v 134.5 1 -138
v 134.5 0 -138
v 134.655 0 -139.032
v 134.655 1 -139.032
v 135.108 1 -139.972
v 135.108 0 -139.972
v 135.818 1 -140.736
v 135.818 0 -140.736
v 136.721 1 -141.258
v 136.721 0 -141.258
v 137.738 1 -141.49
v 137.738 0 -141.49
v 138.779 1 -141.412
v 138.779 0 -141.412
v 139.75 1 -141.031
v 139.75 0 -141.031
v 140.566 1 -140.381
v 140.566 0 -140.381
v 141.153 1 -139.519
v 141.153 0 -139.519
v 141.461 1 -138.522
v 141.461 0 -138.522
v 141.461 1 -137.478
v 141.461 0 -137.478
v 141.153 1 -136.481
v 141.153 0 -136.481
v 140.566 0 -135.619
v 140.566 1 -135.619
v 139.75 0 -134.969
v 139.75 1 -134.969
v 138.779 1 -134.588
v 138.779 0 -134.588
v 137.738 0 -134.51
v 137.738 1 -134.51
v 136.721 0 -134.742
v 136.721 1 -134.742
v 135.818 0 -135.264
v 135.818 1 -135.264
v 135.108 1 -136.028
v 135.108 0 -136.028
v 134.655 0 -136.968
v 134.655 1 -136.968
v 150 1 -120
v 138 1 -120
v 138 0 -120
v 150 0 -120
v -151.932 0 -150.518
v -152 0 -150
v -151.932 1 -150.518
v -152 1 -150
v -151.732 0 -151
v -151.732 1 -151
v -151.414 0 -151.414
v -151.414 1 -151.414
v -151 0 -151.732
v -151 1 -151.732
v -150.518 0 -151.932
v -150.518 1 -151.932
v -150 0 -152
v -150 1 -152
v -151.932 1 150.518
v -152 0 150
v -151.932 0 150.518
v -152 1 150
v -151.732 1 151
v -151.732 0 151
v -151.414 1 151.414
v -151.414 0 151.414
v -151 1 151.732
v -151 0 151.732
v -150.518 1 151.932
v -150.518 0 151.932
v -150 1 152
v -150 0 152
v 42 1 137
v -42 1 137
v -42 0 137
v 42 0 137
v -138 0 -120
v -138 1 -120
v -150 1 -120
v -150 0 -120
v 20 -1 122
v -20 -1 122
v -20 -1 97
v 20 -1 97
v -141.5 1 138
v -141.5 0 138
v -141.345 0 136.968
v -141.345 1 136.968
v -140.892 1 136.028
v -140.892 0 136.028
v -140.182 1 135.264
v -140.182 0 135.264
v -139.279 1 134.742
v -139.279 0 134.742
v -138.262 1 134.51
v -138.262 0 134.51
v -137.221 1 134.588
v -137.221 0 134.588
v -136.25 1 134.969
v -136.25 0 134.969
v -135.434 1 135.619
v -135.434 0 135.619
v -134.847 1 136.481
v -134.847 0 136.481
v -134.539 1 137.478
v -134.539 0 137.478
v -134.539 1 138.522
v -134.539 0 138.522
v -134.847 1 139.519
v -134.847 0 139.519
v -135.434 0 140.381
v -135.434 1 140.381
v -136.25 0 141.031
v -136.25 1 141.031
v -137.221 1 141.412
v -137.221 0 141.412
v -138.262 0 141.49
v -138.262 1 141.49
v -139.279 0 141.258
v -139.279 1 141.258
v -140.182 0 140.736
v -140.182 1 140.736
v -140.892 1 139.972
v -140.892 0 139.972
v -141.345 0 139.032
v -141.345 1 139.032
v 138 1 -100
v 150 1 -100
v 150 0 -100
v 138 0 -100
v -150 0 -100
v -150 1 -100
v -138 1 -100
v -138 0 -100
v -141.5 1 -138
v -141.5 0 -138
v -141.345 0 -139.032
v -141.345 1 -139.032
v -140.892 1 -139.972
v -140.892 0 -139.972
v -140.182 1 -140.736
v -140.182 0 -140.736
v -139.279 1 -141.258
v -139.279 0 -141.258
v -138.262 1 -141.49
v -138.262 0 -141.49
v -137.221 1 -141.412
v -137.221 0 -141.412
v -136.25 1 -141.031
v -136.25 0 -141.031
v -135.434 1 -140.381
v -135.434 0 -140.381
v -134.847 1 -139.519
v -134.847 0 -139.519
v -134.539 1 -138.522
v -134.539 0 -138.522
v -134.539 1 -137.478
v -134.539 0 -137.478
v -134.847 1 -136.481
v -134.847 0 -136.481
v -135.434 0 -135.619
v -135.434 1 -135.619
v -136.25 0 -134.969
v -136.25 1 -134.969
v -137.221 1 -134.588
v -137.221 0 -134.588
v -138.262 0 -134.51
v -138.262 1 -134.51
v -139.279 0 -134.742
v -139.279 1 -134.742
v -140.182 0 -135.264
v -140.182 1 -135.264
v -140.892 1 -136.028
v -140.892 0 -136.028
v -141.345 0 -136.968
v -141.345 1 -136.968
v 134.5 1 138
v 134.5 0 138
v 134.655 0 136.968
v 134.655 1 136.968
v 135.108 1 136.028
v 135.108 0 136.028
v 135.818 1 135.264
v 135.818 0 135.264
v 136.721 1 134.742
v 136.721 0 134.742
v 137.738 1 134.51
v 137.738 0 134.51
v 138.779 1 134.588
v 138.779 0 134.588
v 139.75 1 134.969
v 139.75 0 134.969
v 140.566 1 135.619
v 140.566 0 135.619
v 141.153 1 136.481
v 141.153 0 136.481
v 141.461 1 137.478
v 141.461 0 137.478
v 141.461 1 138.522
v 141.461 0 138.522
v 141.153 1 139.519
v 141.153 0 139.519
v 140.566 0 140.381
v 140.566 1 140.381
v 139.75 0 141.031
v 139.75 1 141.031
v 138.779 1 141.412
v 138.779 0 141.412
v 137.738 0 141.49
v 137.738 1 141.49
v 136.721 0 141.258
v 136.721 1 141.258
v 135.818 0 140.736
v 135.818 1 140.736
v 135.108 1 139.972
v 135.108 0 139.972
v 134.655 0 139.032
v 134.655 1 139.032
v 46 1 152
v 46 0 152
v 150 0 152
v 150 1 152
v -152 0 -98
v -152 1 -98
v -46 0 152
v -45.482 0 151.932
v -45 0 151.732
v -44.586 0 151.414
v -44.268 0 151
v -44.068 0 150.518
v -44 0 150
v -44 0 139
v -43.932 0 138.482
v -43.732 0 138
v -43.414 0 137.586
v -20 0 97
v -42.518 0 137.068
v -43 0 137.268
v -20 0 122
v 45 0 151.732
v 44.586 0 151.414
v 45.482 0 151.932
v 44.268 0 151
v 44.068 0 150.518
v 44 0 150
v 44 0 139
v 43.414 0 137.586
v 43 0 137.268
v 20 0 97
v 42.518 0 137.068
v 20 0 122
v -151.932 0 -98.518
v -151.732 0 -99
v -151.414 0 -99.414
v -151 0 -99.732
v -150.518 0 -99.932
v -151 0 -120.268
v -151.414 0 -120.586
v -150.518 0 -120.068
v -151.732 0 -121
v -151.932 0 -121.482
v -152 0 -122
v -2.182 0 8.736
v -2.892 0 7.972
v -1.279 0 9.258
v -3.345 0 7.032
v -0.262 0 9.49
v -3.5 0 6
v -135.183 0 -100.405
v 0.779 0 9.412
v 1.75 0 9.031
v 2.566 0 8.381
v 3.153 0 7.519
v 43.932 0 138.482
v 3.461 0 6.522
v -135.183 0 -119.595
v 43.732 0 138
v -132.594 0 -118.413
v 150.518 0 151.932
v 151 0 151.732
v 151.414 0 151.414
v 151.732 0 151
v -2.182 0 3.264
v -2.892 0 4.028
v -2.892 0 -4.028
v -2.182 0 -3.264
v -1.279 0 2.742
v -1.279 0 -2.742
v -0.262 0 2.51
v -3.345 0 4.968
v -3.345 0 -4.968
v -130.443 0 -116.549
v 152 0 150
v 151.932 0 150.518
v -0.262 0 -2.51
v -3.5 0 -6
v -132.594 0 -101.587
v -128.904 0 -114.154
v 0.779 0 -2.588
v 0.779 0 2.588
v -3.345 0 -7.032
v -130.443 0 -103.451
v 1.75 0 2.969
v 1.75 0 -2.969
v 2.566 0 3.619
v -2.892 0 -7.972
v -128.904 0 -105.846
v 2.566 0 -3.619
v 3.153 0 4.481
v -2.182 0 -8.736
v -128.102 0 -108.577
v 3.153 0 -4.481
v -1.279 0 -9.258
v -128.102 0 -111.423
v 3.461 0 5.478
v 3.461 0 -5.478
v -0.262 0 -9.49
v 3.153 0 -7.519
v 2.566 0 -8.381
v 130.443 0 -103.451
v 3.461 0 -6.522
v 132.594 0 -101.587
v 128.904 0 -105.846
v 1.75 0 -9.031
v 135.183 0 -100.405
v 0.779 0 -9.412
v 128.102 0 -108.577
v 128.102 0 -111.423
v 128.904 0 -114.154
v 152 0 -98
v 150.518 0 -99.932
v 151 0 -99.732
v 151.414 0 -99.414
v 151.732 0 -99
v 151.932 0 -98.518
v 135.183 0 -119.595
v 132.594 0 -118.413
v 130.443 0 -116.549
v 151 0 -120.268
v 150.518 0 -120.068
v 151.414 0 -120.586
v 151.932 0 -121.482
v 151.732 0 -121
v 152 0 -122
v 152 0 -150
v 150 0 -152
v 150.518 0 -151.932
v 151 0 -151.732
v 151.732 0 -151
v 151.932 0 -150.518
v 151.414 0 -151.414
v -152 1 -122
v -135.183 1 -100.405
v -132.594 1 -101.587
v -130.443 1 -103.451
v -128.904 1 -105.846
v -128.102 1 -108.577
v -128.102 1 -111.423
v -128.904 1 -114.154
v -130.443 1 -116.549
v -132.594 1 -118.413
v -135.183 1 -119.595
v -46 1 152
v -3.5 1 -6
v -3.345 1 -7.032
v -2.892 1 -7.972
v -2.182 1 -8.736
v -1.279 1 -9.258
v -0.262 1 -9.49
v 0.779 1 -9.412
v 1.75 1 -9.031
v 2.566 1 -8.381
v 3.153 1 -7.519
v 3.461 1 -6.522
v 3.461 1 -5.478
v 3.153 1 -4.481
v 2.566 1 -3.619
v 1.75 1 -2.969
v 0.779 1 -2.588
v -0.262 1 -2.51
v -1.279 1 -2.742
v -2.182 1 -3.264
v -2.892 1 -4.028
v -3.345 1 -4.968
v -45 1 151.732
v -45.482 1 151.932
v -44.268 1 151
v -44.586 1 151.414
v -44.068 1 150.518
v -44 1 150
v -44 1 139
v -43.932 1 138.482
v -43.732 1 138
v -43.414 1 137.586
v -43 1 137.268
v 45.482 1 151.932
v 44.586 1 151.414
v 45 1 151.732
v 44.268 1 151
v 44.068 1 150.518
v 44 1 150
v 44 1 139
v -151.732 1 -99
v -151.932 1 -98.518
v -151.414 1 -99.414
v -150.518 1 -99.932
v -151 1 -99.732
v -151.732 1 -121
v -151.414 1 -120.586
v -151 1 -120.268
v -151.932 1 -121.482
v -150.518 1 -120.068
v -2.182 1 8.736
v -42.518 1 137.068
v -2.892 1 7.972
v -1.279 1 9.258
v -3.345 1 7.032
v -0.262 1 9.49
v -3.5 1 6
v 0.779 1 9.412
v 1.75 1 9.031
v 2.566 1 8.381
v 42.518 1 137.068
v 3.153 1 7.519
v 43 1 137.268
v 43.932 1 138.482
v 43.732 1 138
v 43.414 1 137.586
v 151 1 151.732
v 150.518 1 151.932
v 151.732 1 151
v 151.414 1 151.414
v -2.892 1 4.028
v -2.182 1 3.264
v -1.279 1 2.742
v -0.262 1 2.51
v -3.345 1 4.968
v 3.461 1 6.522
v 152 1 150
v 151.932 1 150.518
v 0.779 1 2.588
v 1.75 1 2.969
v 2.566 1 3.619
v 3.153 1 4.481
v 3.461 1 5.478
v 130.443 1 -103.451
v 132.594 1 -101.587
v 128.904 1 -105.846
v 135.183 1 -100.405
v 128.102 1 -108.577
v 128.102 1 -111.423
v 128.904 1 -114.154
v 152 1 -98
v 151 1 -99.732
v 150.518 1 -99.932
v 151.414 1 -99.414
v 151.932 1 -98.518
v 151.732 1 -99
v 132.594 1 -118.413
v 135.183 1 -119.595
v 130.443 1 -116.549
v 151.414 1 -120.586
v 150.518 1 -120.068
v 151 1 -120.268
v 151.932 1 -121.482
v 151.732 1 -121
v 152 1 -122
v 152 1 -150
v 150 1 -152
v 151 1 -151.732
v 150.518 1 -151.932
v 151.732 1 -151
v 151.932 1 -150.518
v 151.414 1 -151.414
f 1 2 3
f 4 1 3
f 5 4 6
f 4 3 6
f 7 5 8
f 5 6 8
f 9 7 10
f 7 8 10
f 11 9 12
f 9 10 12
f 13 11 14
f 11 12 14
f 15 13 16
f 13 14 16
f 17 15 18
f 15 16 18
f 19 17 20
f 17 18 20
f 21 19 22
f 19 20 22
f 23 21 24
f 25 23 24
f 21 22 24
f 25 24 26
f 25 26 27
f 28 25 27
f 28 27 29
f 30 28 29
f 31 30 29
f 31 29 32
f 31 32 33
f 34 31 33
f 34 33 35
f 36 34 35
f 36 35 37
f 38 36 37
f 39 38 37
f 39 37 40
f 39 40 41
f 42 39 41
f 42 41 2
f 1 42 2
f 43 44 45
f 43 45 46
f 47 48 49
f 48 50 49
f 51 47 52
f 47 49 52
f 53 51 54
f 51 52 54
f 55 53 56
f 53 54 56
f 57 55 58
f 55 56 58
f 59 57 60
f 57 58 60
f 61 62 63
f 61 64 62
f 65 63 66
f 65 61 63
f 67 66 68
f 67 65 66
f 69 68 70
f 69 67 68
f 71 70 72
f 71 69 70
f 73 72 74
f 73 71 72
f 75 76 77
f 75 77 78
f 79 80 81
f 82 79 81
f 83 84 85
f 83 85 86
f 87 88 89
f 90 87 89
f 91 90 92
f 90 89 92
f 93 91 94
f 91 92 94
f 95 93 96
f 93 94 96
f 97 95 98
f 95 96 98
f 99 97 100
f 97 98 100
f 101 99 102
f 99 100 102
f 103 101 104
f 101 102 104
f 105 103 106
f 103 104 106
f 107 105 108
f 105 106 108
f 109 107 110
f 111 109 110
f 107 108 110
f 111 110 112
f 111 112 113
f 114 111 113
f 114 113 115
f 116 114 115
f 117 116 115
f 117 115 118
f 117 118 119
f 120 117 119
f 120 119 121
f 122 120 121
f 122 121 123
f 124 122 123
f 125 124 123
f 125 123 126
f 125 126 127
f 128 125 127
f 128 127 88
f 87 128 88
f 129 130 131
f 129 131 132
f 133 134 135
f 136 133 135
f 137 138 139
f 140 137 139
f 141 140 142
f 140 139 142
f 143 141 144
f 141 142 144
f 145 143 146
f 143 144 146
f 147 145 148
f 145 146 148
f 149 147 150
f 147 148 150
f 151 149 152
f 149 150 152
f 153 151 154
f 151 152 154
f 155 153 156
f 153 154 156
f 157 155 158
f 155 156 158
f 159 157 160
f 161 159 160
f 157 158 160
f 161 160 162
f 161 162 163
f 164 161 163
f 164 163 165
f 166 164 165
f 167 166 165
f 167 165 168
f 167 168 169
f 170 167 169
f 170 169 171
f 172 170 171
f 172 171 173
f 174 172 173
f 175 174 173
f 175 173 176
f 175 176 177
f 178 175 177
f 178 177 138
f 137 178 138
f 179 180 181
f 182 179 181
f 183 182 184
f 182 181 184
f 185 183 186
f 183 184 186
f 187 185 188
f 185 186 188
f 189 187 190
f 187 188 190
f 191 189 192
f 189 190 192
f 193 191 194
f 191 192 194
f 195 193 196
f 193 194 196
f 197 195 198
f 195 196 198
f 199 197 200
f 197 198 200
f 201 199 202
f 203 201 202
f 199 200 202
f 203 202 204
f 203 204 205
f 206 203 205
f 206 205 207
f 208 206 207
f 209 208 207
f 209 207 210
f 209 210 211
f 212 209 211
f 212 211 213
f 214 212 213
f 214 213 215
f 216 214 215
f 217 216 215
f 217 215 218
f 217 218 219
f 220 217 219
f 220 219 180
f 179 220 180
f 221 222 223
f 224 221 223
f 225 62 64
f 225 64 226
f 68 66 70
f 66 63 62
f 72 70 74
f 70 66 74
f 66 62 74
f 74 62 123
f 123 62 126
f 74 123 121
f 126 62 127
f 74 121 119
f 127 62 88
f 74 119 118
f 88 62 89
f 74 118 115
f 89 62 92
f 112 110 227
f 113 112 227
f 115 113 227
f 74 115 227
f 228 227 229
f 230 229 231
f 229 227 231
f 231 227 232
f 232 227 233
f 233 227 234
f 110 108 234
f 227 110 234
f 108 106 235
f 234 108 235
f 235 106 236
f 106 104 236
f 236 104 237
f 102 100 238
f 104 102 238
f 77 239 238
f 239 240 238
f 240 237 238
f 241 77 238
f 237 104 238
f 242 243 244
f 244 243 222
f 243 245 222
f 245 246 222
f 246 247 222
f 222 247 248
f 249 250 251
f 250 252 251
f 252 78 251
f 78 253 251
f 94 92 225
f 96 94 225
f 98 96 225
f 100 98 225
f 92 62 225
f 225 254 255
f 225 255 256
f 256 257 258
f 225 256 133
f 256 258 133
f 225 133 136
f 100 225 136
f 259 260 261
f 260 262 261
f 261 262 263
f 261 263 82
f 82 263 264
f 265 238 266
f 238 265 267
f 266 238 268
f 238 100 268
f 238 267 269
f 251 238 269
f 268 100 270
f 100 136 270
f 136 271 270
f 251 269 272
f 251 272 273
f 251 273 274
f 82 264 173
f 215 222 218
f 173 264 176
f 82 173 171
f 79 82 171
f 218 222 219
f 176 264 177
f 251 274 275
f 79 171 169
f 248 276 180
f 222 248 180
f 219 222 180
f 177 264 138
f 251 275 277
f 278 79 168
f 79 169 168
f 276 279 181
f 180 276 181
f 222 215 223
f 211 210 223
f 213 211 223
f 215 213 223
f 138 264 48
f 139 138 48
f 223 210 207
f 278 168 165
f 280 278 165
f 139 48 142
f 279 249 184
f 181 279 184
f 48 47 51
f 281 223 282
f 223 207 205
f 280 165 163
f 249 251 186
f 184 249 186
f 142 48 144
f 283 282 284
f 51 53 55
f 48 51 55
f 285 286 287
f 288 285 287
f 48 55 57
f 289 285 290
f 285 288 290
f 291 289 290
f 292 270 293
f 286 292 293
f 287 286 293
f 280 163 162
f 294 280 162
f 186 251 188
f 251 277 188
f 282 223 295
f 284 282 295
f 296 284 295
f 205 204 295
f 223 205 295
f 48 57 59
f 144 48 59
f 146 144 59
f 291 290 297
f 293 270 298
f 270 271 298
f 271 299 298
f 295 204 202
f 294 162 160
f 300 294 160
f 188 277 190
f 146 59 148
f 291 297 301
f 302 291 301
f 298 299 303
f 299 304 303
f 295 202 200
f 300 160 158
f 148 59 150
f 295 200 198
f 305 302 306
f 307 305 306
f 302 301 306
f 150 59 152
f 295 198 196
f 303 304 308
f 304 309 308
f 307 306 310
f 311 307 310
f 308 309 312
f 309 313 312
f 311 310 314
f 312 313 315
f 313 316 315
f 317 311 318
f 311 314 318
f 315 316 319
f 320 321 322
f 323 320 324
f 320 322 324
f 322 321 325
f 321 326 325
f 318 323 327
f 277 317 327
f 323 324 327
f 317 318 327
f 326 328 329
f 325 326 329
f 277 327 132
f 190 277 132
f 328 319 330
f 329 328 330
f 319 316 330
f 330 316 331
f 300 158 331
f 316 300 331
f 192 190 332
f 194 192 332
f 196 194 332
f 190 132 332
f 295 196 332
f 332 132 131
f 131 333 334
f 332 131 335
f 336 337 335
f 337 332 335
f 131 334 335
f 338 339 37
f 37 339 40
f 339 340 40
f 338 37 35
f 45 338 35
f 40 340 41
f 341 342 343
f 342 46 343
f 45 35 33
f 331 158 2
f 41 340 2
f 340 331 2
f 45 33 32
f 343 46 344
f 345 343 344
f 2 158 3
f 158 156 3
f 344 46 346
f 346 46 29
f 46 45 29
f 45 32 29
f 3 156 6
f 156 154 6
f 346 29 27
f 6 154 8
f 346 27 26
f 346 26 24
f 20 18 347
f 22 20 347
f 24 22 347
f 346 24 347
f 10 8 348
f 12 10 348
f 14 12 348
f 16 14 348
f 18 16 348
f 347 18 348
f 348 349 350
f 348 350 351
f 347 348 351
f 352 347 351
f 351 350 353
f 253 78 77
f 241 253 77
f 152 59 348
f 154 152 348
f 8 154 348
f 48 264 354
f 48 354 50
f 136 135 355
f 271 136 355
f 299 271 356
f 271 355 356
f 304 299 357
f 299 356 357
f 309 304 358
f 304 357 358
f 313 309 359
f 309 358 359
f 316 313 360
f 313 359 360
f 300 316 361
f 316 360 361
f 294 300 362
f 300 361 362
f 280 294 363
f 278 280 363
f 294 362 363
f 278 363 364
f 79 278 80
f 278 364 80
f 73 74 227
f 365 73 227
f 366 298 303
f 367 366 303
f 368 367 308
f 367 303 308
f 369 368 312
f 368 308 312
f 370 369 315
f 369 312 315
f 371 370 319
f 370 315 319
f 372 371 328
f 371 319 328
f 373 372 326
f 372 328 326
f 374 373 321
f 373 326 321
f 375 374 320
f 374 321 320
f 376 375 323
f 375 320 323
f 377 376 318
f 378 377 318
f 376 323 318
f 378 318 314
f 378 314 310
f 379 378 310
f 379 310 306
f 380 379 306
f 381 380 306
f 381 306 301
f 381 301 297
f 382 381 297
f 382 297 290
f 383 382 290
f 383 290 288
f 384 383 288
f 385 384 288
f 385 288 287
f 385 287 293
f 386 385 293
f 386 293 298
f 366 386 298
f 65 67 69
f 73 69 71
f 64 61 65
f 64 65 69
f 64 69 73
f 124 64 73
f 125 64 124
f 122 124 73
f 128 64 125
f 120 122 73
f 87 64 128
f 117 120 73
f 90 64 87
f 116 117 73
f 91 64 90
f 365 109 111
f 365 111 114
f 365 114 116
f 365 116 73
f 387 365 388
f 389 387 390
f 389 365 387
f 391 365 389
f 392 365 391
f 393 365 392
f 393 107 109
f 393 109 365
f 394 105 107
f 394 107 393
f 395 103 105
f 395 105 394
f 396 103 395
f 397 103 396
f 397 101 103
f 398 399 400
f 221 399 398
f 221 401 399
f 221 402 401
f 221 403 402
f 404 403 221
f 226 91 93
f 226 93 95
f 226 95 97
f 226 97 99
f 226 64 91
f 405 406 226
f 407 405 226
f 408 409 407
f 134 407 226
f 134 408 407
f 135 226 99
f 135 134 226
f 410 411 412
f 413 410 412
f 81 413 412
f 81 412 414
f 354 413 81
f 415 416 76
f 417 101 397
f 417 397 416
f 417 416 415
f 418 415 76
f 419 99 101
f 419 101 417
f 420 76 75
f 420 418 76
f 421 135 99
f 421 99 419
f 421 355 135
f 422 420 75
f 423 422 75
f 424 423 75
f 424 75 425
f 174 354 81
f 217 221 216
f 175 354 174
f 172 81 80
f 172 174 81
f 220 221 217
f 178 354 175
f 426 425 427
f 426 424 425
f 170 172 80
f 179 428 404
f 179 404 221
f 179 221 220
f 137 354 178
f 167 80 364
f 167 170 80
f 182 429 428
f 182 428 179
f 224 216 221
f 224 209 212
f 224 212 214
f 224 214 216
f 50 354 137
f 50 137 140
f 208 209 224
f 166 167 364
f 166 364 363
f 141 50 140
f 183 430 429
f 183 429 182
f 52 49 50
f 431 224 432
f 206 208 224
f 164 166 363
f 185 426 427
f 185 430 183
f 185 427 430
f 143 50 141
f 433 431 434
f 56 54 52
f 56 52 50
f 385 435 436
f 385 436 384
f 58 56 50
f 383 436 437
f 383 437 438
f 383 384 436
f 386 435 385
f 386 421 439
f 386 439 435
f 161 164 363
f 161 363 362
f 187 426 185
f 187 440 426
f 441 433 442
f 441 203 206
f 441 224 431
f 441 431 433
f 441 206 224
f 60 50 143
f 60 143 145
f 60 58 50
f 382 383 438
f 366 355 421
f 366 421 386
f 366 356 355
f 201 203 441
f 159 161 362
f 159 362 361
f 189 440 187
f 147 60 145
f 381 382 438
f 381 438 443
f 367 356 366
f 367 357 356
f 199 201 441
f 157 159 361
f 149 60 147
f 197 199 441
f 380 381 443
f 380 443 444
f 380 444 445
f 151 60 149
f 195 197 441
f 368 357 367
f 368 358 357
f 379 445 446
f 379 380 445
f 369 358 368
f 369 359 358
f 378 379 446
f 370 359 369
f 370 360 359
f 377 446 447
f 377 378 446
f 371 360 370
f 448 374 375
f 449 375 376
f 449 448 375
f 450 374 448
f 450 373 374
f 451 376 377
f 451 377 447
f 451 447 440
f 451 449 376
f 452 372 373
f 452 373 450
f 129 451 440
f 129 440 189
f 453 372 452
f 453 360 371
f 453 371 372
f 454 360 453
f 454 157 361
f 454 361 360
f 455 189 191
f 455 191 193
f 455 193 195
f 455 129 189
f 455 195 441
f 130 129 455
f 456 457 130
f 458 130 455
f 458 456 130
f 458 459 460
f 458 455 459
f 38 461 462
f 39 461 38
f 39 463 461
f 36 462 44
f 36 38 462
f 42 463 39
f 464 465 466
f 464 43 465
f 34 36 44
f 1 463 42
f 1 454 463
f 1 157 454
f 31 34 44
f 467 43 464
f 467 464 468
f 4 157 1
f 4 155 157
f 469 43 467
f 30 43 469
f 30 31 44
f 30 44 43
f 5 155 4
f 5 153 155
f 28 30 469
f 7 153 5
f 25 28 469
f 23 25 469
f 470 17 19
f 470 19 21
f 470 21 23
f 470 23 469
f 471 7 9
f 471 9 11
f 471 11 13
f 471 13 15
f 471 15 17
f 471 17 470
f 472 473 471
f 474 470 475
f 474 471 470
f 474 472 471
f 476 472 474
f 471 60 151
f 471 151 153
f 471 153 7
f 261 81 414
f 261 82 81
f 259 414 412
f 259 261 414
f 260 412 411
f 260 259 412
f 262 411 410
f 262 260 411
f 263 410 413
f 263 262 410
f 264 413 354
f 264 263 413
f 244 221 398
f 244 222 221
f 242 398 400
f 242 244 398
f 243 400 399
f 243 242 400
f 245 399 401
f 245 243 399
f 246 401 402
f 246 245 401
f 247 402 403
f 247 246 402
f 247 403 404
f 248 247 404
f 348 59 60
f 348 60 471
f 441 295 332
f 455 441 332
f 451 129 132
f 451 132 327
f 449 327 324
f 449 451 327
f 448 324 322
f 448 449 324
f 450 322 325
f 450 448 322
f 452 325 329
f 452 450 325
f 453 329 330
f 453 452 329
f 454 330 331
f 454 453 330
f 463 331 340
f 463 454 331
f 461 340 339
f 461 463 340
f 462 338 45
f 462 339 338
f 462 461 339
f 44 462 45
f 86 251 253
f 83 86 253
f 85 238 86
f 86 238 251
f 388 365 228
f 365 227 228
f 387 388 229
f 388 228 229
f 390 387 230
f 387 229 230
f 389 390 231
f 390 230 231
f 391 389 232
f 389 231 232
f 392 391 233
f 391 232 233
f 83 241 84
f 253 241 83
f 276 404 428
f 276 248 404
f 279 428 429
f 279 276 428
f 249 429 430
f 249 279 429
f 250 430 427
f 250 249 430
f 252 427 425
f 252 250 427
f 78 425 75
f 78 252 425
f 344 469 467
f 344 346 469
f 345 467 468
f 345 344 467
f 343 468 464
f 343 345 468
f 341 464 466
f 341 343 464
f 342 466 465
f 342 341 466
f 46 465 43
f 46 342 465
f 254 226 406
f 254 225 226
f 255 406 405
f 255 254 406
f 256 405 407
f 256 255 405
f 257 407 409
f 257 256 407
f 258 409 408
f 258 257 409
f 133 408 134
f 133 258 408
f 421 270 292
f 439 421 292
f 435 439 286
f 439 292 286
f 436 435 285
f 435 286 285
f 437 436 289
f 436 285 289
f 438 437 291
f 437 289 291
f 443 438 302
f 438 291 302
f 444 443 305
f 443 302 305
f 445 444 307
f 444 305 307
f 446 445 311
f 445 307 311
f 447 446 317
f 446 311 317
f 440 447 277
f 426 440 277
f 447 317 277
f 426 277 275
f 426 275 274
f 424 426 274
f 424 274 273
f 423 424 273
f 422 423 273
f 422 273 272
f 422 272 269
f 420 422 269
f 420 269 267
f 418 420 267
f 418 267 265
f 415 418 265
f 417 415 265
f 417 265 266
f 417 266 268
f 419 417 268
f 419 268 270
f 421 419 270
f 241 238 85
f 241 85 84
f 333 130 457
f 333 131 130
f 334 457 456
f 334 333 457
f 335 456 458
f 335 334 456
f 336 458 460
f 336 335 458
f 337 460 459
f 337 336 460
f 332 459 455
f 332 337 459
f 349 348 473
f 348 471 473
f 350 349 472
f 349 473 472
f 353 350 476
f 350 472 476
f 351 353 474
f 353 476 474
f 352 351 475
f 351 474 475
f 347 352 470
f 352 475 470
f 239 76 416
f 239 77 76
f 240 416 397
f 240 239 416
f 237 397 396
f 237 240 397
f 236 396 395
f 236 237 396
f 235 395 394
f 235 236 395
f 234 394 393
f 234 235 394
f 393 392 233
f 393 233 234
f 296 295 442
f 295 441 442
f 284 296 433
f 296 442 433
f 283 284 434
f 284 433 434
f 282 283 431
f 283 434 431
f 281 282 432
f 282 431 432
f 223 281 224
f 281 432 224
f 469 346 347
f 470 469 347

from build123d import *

# Parameters (mm, degrees)
SKETCH1_W                = 304
SKETCH1_H                = 304
BOSS_EXTRUDE1_DEPTH      = 1
SKETCH2_W                = 88
SKETCH2_H                = 15
CUT_EXTRUDE1_DEPTH       = 215.962787477
FILLET1_R                = 2
F_7_0_7_DIAMETER_HOLE1_D = 7
SKETCH6_W                = 40
SKETCH6_H                = 25
BOSS_EXTRUDE2_DEPTH      = 1


with BuildPart() as part:
    # Sketch1 → Boss-Extrude1 (new body)
    with BuildSketch(Plane(origin=(0, 0, 0), x_dir=(1, 0, 0), z_dir=(0, 1, 0))):
        Rectangle(SKETCH1_W, SKETCH1_H)
    extrude(amount=BOSS_EXTRUDE1_DEPTH)

    # Sketch2 → Cut-Extrude1 (cut, through all)
    with BuildSketch(Plane(origin=(0, 1, 0), x_dir=(1, 0, 0), z_dir=(0, 1, 0))):
        with Locations((0, -144.5)):
            Rectangle(SKETCH2_W, SKETCH2_H)
        with BuildLine():
            Line((-152, 100), (-138, 100))
            ThreePointArc((-138, 100), (-128, 110), (-138, 120))
            Line((-138, 120), (-152, 120))
            Line((-152, 120), (-152, 100))
        make_face()
        with BuildLine():
            Line((152, 100), (138, 100))
            ThreePointArc((138, 100), (128, 110), (138, 120))
            Line((138, 120), (152, 120))
            Line((152, 120), (152, 100))
        make_face()
    extrude(amount=-CUT_EXTRUDE1_DEPTH, mode=Mode.SUBTRACT)

    # Fillet1
    fillet1_edges = [part.edges().sort_by_distance(p)[0] for p in [
        (44, 0.5, 152),
        (-44, 0.5, 152),
        (-44, 0.5, 137),
        (44, 0.5, 137),
        (-152, 0.5, -100),
        (-152, 0.5, -120),
        (152, 0.5, -120),
        (152, 0.5, -100),
        (-152, 0.5, -152),
        (152, 0.5, -152),
        (152, 0.5, 152),
        (-152, 0.5, 152),
    ]]
    fillet(fillet1_edges, radius=FILLET1_R)

    # Ø7.0 (7) Diameter Hole1 (through all)
    with Locations(Plane(origin=(0, 1, 0), x_dir=(1, 0, 0), z_dir=(0, 1, 0))):
        with Locations((-138, -138), (138, 138), (-138, 138), (138, -138), (0, -6), (0, 6)):
            Hole(F_7_0_7_DIAMETER_HOLE1_D / 2)

    # Sketch6 → Boss-Extrude2 (add)
    with BuildSketch(Plane.XZ):
        with Locations((0, 109.5)):
            Rectangle(SKETCH6_W, SKETCH6_H)
    extrude(amount=BOSS_EXTRUDE2_DEPTH)


solid = part.part
